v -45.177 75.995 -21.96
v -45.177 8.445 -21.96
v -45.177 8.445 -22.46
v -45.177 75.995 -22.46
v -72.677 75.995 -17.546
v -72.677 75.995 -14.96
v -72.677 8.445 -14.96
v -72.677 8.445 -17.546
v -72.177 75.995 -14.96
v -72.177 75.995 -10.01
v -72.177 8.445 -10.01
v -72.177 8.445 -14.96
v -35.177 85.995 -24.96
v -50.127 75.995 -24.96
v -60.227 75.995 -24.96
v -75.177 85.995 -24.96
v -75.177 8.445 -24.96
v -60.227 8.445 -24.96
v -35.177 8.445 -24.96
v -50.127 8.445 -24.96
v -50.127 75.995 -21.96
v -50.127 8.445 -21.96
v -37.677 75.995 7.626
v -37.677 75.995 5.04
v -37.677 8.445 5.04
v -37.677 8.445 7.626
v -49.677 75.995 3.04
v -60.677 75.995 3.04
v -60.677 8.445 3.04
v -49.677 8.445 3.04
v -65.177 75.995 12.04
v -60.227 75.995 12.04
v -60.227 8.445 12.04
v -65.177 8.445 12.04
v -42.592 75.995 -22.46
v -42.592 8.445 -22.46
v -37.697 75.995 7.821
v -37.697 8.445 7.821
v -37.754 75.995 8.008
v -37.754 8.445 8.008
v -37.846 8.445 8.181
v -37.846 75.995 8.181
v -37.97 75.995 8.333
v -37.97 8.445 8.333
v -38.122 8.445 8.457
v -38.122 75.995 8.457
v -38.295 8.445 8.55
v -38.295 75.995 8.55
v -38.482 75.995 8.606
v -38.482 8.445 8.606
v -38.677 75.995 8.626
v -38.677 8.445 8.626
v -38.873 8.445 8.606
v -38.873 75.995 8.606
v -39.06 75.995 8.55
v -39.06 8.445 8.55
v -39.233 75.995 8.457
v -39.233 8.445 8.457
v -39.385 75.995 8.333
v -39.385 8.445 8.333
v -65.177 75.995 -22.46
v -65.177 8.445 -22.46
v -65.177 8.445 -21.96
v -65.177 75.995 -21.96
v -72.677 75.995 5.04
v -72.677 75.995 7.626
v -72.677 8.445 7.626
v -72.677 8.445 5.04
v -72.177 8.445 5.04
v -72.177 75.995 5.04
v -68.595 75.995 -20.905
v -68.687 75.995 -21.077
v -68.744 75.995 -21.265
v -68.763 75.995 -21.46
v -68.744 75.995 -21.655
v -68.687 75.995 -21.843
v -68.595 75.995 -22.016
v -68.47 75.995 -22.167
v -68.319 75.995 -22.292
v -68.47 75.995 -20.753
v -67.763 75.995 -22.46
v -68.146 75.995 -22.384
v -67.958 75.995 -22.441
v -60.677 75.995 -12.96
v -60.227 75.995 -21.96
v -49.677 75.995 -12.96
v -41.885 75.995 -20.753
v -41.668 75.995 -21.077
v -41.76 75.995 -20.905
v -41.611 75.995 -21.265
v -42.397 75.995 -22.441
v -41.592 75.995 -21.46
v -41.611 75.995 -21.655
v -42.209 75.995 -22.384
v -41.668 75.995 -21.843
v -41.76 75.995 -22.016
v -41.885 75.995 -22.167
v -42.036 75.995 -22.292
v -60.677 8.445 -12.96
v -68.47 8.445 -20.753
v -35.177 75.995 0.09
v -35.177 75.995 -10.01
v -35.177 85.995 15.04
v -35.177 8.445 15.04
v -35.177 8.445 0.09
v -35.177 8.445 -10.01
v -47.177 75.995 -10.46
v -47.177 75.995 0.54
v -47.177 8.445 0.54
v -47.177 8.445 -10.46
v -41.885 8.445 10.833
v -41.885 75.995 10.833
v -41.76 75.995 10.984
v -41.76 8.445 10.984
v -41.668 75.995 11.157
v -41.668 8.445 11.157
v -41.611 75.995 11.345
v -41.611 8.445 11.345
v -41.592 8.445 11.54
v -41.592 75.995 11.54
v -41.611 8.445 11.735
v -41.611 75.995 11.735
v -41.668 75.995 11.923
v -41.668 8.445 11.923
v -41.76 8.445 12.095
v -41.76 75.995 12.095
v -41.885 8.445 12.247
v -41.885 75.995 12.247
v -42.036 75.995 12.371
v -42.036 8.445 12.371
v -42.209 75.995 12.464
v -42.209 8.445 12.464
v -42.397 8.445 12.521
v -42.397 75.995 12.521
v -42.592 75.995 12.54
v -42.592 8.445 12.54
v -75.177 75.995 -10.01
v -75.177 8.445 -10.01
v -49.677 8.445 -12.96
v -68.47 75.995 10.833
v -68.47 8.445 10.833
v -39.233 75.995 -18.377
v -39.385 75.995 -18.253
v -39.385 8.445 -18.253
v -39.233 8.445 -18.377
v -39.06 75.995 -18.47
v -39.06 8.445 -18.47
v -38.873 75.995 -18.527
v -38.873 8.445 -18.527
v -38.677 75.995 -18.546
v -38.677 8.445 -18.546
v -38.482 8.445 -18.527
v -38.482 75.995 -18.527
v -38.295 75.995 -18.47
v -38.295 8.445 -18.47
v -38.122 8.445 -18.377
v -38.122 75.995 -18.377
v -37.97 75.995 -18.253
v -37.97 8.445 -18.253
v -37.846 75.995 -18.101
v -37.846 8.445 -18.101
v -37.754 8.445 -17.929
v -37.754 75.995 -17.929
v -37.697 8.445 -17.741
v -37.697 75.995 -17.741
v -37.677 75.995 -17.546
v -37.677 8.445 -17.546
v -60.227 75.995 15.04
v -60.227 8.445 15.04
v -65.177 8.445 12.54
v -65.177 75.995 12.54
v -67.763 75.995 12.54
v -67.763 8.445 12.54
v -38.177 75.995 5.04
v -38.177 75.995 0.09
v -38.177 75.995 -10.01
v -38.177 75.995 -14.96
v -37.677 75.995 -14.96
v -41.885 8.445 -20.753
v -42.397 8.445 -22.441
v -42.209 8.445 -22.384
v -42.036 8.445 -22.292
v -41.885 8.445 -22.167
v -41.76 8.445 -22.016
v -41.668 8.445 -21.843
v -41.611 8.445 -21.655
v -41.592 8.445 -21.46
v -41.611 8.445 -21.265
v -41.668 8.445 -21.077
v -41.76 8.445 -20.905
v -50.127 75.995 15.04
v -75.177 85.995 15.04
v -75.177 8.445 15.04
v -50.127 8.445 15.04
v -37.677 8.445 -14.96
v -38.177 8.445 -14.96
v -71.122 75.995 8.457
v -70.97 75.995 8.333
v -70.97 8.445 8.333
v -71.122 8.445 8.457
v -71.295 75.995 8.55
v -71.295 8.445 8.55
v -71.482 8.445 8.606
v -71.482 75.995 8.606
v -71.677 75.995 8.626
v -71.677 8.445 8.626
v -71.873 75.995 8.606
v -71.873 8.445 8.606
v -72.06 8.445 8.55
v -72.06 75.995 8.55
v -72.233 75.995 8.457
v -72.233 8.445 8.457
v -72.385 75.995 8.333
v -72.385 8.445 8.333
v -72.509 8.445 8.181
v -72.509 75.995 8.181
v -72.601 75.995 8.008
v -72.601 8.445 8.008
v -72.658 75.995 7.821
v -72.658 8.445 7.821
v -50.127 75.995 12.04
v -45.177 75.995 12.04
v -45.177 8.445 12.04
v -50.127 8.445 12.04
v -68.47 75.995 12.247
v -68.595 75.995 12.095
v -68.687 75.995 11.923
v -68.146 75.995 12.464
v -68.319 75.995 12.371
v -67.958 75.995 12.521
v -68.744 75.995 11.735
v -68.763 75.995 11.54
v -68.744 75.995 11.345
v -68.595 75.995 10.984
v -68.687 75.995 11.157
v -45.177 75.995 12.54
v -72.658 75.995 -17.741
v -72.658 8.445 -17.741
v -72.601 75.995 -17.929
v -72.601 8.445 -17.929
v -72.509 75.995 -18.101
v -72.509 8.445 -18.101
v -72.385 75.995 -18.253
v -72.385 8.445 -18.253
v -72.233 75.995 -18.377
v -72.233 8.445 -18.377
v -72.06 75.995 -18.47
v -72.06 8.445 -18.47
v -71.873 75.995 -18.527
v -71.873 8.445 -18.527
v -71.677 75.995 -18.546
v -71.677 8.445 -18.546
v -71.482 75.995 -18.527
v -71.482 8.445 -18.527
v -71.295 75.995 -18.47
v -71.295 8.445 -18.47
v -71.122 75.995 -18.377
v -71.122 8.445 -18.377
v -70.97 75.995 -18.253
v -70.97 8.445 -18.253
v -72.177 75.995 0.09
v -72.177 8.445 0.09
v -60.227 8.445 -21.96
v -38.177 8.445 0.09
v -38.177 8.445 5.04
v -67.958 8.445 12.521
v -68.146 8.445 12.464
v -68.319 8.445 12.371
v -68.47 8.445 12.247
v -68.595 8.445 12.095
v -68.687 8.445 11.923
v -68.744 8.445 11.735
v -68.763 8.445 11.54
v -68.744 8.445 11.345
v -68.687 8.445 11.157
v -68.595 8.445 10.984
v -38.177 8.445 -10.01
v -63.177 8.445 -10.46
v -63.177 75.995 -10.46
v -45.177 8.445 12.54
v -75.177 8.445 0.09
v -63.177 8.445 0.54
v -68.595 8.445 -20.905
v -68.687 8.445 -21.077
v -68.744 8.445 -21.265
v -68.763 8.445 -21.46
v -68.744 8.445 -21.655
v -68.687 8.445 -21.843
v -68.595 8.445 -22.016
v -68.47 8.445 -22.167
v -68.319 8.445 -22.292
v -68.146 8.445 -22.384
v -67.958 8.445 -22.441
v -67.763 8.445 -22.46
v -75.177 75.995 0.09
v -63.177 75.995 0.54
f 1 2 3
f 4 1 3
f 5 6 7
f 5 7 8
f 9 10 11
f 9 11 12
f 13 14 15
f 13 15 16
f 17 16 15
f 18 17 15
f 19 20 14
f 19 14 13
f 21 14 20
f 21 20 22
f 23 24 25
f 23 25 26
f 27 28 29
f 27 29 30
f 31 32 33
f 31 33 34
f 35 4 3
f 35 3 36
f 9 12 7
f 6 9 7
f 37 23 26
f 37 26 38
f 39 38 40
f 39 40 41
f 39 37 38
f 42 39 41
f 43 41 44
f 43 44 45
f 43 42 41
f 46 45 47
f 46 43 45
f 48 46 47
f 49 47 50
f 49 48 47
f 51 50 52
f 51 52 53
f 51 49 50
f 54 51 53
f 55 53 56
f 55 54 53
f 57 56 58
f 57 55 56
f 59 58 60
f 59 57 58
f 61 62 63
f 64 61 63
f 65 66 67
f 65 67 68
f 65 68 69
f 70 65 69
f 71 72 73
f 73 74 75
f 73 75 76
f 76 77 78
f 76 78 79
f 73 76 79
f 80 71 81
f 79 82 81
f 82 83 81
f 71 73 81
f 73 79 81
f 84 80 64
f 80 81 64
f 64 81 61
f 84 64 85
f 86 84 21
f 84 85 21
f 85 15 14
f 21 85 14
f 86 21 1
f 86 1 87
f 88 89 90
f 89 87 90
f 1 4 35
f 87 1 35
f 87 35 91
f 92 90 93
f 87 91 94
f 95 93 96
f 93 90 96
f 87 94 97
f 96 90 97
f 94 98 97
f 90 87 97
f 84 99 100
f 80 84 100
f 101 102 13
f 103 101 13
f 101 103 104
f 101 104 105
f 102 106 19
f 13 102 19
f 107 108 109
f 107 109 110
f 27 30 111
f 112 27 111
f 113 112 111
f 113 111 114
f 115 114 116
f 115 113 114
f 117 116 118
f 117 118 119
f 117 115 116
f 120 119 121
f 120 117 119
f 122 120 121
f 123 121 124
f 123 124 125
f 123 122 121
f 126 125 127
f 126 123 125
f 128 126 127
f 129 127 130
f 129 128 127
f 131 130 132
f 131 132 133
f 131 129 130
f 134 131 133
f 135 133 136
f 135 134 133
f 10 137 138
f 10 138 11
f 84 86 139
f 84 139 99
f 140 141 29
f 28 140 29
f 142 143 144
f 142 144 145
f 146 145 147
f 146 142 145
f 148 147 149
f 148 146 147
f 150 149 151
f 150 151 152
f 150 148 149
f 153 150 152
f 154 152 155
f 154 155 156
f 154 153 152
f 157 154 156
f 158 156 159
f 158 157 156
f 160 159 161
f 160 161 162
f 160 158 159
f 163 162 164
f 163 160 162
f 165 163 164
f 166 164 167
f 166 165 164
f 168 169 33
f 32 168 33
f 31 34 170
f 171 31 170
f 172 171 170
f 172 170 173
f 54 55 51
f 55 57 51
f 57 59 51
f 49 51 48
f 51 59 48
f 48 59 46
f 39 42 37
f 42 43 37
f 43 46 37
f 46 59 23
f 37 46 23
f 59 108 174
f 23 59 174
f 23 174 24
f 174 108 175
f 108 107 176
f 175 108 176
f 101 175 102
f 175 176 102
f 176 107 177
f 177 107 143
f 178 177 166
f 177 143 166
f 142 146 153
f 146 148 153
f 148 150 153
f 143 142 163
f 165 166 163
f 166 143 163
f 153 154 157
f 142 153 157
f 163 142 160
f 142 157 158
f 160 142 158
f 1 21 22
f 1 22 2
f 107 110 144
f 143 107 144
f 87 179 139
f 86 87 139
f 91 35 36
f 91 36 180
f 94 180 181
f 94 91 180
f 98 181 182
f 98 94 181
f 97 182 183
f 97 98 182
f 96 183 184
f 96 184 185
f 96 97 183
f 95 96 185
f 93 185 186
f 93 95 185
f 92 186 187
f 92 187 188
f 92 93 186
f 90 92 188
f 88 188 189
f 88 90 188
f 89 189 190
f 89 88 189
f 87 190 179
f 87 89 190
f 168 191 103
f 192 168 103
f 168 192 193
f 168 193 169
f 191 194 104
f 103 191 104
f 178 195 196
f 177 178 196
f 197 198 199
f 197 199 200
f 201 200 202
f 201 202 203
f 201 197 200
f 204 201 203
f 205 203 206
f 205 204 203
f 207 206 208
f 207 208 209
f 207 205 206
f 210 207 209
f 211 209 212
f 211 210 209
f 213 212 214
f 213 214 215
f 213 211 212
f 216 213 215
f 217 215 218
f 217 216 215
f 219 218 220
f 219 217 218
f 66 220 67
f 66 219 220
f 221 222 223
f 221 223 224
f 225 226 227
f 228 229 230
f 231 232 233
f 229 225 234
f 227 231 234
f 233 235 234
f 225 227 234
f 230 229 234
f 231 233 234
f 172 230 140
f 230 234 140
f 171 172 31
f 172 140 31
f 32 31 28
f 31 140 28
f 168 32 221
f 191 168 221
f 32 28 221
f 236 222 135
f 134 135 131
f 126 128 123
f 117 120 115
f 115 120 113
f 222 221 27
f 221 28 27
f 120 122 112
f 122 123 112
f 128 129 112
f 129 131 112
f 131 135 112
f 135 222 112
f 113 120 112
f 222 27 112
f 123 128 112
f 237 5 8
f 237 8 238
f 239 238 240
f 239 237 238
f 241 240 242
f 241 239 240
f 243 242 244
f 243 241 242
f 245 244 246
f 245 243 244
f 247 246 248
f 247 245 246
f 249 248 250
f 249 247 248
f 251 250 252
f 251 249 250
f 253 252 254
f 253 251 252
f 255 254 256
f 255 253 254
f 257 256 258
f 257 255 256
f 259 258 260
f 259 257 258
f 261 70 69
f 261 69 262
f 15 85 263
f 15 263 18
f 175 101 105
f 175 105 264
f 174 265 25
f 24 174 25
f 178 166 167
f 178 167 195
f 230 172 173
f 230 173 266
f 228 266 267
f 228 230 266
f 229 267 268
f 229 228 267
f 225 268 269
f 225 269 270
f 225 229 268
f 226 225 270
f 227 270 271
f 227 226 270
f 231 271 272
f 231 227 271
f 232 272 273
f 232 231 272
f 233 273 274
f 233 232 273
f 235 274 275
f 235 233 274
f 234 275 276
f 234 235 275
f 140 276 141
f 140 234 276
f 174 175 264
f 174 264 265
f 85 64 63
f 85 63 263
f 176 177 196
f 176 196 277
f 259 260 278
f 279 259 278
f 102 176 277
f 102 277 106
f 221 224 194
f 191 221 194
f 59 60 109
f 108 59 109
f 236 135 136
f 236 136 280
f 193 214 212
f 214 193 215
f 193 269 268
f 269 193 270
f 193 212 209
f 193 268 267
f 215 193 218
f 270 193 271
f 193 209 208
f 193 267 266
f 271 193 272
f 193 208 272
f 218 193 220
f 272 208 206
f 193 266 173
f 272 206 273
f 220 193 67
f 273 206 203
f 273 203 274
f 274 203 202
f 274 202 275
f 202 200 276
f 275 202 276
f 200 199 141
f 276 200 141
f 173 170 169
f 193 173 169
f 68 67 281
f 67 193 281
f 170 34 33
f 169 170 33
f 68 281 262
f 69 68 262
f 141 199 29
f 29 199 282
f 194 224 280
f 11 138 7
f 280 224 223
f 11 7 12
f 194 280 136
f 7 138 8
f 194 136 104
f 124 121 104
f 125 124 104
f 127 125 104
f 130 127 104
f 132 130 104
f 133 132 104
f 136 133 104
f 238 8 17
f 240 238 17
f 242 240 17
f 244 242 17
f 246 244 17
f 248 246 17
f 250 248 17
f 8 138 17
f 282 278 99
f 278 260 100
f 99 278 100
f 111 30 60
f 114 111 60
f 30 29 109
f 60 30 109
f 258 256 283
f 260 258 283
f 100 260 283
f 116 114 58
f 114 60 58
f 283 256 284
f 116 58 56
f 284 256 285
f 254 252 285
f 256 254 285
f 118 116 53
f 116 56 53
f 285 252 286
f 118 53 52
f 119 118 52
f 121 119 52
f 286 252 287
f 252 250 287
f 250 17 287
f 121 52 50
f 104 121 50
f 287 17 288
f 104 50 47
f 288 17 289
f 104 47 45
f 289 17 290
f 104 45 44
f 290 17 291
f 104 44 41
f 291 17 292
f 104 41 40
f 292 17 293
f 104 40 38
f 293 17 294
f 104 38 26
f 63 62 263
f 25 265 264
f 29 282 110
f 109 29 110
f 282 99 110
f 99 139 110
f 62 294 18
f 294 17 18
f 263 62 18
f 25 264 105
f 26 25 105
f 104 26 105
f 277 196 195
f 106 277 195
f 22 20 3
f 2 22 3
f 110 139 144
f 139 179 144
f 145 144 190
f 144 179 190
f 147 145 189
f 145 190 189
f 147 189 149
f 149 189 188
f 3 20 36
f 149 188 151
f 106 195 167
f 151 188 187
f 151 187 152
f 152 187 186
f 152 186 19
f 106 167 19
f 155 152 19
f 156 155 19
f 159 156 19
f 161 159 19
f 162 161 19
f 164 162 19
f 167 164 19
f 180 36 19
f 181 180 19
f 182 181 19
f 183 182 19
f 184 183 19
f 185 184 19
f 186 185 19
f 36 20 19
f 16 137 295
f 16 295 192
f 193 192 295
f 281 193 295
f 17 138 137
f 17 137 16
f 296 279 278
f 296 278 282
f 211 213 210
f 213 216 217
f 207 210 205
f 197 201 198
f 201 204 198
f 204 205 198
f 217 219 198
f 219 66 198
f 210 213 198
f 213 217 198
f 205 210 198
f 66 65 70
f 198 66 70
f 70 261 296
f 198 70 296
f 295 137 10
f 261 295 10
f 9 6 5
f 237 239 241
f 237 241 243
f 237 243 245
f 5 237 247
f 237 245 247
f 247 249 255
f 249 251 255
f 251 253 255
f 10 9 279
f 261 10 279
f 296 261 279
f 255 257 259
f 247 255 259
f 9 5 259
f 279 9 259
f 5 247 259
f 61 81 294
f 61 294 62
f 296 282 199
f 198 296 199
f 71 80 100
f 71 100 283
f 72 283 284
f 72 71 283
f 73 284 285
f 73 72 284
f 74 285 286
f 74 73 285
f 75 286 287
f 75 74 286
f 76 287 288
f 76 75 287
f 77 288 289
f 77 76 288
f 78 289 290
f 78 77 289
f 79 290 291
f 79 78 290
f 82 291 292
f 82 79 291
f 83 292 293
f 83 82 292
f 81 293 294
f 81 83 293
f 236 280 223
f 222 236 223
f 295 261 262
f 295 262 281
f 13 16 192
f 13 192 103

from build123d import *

# Parameters (mm, degrees)
BOSS_EXTRUDE1_DEPTH = 67.55
SKETCH2_W           = 40
SKETCH2_H           = 40
BOSS_EXTRUDE2_DEPTH = 10


with BuildPart() as part:
    # Sketch1 → Boss-Extrude1 (new body)
    with BuildSketch(Plane(origin=(0, 75.994571645, 0), x_dir=(1, 0, 0), z_dir=(0, 1, 0))):
        with BuildLine():
            Line((-75.17747299, -15.039868045), (-60.22747299, -15.039868045))
            Line((-60.22747299, -15.039868045), (-60.22747299, -12.039868045))
            Line((-60.22747299, -12.039868045), (-65.17747299, -12.039868045))
            Line((-65.17747299, -12.039868045), (-65.17747299, -12.539868045))
            Line((-65.17747299, -12.539868045), (-67.763259428, -12.539868045))
            ThreePointArc((-67.763259428, -12.539868045), (-68.68713896, -11.922551477), (-68.470366209, -10.832761264))
            Line((-68.470366209, -10.832761264), (-60.67747299, -3.039868045))
            Line((-60.67747299, -3.039868045), (-49.67747299, -3.039868045))
            Line((-49.67747299, -3.039868045), (-41.884579771, -10.832761264))
            ThreePointArc((-41.884579771, -10.832761264), (-41.66780702, -11.922551477), (-42.591686553, -12.539868045))
            Line((-42.591686553, -12.539868045), (-45.17747299, -12.539868045))
            Line((-45.17747299, -12.539868045), (-45.17747299, -12.039868045))
            Line((-45.17747299, -12.039868045), (-50.12747299, -12.039868045))
            Line((-50.12747299, -12.039868045), (-50.12747299, -15.039868045))
            Line((-50.12747299, -15.039868045), (-35.17747299, -15.039868045))
            Line((-35.17747299, -15.039868045), (-35.17747299, -0.089868045))
            Line((-35.17747299, -0.089868045), (-38.17747299, -0.089868045))
            Line((-38.17747299, -0.089868045), (-38.17747299, -5.039868045))
            Line((-38.17747299, -5.039868045), (-37.67747299, -5.039868045))
            Line((-37.67747299, -5.039868045), (-37.67747299, -7.625654482))
            ThreePointArc((-37.67747299, -7.625654482), (-38.294789558, -8.549534015), (-39.384579771, -8.332761264))
            Line((-39.384579771, -8.332761264), (-47.17747299, -0.539868045))
            Line((-47.17747299, -0.539868045), (-47.17747299, 10.460131955))
            Line((-47.17747299, 10.460131955), (-39.384579771, 18.253025174))
            ThreePointArc((-39.384579771, 18.253025174), (-38.294789558, 18.469797925), (-37.67747299, 17.545918393))
            Line((-37.67747299, 17.545918393), (-37.67747299, 14.960131955))
            Line((-37.67747299, 14.960131955), (-38.17747299, 14.960131955))
            Line((-38.17747299, 14.960131955), (-38.17747299, 10.010131955))
            Line((-38.17747299, 10.010131955), (-35.17747299, 10.010131955))
            Line((-35.17747299, 10.010131955), (-35.17747299, 24.960131955))
            Line((-35.17747299, 24.960131955), (-50.12747299, 24.960131955))
            Line((-50.12747299, 24.960131955), (-50.12747299, 21.960131955))
            Line((-50.12747299, 21.960131955), (-45.17747299, 21.960131955))
            Line((-45.17747299, 21.960131955), (-45.17747299, 22.460131955))
            Line((-45.17747299, 22.460131955), (-42.591686553, 22.460131955))
            ThreePointArc((-42.591686553, 22.460131955), (-41.66780702, 21.842815388), (-41.884579771, 20.753025174))
            Line((-41.884579771, 20.753025174), (-49.67747299, 12.960131955))
            Line((-49.67747299, 12.960131955), (-60.67747299, 12.960131955))
            Line((-60.67747299, 12.960131955), (-68.470366209, 20.753025174))
            ThreePointArc((-68.470366209, 20.753025174), (-68.68713896, 21.842815388), (-67.763259428, 22.460131955))
            Line((-67.763259428, 22.460131955), (-65.17747299, 22.460131955))
            Line((-65.17747299, 22.460131955), (-65.17747299, 21.960131955))
            Line((-65.17747299, 21.960131955), (-60.22747299, 21.960131955))
            Line((-60.22747299, 21.960131955), (-60.22747299, 24.960131955))
            Line((-60.22747299, 24.960131955), (-75.17747299, 24.960131955))
            Line((-75.17747299, 24.960131955), (-75.17747299, 10.010131955))
            Line((-75.17747299, 10.010131955), (-72.17747299, 10.010131955))
            Line((-72.17747299, 10.010131955), (-72.17747299, 14.960131955))
            Line((-72.17747299, 14.960131955), (-72.67747299, 14.960131955))
            Line((-72.67747299, 14.960131955), (-72.67747299, 17.545918393))
            ThreePointArc((-72.67747299, 17.545918393), (-72.060156423, 18.469797925), (-70.970366209, 18.253025174))
            Line((-70.970366209, 18.253025174), (-63.17747299, 10.460131955))
            Line((-63.17747299, 10.460131955), (-63.17747299, -0.539868045))
            Line((-63.17747299, -0.539868045), (-70.970366209, -8.332761264))
            ThreePointArc((-70.970366209, -8.332761264), (-72.060156423, -8.549534015), (-72.67747299, -7.625654482))
            Line((-72.67747299, -7.625654482), (-72.67747299, -5.039868045))
            Line((-72.67747299, -5.039868045), (-72.17747299, -5.039868045))
            Line((-72.17747299, -5.039868045), (-72.17747299, -0.089868045))
            Line((-72.17747299, -0.089868045), (-75.17747299, -0.089868045))
            Line((-75.17747299, -0.089868045), (-75.17747299, -15.039868045))
        make_face()
    extrude(amount=-BOSS_EXTRUDE1_DEPTH)

    # Sketch2 → Boss-Extrude2 (add)
    with BuildSketch(Plane(origin=(0, 75.994571645, 0), x_dir=(1, 0, 0), z_dir=(0, 1, 0))):
        with Locations((-55.17747299, 4.960131955)):
            Rectangle(SKETCH2_W, SKETCH2_H)
    extrude(amount=BOSS_EXTRUDE2_DEPTH)


solid = part.part
